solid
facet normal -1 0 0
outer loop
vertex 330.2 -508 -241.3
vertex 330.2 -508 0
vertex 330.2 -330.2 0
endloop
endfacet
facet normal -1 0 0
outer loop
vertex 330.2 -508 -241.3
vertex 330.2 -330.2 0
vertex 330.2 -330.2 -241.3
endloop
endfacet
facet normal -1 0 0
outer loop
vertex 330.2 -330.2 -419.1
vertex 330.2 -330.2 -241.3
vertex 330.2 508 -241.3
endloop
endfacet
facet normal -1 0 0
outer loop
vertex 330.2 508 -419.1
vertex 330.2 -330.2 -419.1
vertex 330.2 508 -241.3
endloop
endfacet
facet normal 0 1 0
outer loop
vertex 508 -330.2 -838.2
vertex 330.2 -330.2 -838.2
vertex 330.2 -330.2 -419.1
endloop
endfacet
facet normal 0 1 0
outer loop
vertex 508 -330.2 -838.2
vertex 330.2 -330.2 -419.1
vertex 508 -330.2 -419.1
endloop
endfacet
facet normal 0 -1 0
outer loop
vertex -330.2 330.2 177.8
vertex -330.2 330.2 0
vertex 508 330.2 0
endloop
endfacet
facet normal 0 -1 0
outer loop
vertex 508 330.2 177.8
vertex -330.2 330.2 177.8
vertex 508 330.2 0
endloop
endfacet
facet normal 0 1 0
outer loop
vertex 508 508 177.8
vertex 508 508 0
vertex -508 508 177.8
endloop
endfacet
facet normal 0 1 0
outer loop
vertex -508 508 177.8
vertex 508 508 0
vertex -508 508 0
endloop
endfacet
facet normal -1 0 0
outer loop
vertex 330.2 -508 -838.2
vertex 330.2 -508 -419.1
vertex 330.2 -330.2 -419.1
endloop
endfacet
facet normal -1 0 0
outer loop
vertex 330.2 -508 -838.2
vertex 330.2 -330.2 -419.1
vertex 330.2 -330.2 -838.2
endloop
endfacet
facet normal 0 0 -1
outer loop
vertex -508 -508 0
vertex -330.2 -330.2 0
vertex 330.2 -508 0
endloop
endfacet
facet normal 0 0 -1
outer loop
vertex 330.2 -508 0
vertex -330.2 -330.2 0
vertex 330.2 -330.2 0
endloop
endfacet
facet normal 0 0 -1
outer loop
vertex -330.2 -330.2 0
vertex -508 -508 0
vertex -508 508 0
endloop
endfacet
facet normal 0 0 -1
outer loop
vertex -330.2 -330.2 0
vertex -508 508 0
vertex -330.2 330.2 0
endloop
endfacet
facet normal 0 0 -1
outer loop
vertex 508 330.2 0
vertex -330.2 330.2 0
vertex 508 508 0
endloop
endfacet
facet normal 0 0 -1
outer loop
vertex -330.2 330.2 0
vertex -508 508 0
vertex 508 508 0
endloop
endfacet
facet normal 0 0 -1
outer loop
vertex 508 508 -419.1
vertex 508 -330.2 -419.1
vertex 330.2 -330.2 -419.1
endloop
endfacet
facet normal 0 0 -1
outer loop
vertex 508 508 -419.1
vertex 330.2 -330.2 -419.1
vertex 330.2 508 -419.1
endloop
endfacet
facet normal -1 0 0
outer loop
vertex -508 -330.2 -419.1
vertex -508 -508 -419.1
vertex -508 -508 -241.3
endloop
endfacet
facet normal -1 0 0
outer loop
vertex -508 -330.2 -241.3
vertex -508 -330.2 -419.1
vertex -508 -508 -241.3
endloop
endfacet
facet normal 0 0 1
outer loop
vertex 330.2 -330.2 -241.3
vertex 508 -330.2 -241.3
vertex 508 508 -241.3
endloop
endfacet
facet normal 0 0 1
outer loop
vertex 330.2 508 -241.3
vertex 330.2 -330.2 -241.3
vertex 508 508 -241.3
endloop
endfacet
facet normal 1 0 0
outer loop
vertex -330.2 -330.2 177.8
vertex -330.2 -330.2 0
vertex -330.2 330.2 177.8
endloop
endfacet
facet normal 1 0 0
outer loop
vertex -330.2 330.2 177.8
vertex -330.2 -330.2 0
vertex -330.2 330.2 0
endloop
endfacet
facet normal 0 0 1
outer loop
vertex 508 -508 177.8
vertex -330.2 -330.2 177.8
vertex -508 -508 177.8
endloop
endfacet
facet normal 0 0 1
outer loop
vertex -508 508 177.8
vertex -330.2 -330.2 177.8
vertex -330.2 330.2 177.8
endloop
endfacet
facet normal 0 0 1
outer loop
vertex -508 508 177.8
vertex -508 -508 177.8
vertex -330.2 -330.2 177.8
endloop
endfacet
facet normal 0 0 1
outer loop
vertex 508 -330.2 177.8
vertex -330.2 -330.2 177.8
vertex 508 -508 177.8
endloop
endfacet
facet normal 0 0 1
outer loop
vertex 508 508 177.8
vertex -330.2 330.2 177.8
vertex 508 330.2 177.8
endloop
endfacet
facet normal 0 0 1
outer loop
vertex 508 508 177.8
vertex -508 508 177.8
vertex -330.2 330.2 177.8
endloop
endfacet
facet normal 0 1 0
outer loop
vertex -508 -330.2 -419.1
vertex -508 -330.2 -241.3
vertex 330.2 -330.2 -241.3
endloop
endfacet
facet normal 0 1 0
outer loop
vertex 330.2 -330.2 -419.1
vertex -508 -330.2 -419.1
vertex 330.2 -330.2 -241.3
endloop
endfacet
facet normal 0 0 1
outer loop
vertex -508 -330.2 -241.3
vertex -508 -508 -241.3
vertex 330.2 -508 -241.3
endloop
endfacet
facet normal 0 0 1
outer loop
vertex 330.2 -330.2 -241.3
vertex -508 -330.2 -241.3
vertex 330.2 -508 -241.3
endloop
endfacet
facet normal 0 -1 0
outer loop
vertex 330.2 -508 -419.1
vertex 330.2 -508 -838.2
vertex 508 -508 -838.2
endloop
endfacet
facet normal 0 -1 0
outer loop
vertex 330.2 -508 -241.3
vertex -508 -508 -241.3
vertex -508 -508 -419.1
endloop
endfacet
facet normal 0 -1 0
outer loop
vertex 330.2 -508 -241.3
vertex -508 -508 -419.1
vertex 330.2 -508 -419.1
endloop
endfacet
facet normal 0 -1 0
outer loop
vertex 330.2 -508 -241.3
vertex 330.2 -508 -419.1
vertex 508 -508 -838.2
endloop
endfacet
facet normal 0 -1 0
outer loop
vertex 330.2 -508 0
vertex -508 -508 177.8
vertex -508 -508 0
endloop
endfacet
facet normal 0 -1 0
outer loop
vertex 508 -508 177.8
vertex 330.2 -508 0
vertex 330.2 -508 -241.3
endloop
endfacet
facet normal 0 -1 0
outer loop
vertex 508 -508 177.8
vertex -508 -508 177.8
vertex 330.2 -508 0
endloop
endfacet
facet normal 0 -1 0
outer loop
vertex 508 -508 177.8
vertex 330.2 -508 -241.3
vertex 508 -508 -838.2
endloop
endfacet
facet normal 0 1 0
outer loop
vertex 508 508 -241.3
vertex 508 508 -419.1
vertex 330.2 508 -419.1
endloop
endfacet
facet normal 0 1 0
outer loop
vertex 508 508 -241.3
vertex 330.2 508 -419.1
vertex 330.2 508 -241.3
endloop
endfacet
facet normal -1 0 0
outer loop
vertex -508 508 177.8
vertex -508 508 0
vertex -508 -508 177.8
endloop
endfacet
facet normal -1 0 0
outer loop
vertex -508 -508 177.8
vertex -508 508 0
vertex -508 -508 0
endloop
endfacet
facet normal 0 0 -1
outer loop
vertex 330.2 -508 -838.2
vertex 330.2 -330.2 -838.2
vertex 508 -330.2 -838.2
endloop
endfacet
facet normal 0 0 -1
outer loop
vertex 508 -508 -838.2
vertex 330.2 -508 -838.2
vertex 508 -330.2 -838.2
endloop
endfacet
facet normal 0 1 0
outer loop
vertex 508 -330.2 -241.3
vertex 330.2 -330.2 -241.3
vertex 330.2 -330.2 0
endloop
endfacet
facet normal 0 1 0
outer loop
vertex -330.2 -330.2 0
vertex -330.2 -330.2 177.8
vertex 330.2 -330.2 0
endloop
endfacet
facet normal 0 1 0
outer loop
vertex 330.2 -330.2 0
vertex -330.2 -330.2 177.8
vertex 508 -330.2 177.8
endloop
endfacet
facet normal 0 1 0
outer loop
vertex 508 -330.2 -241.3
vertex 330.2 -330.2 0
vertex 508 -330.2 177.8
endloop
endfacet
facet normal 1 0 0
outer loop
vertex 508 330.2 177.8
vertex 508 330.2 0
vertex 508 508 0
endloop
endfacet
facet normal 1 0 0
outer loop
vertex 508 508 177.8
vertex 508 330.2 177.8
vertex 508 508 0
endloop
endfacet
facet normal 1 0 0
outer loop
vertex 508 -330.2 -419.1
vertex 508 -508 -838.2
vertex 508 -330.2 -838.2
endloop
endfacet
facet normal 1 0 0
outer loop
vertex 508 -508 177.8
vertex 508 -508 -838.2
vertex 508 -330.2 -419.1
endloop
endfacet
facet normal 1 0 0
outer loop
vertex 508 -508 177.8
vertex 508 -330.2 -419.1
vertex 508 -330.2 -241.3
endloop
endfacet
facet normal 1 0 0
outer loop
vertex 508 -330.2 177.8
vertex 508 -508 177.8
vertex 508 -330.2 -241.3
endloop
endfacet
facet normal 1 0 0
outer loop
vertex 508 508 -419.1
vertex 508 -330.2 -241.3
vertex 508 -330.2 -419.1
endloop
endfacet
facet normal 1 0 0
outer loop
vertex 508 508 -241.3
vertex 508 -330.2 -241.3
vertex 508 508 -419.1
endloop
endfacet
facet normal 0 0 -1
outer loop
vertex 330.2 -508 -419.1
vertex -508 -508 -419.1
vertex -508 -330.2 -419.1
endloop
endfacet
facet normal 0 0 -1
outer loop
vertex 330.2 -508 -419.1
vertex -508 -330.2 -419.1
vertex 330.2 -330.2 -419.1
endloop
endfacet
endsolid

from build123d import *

# Parameters (mm, degrees)
F1_DEPTH = 177.8
F2_W     = 177.8
F2_H     = 241.3
F2_H_2   = 177.8
F2_H_3   = 419.1
F2_W_2   = 838.2
F3_DEPTH = 177.8
F4_W     = 838.2
F4_H     = 177.8
F5_DEPTH = 177.8


with BuildPart() as f1:
    # F0 (on Top) → F1 (new body)
    with BuildSketch(Plane.XY):
        Polygon((508, 330.2), (508, 508), (-508, 508), (-508, -508), (508, -508), (508, -330.2), (-330.2, -330.2), (-330.2, 330.2), align=None)
    extrude(amount=F1_DEPTH)

    # F2 (on face) → F3 (join)
    with BuildSketch(Plane.XZ.offset(508)):
        with Locations((419.1, -120.65)):
            Rectangle(F2_W, F2_H)
        with Locations((419.1, -330.2)):
            Rectangle(F2_W, F2_H_2)
        with Locations((419.1, -628.65)):
            Rectangle(F2_W, F2_H_3)
        with Locations((-88.9, -330.2)):
            Rectangle(F2_W_2, F2_H_2)
    extrude(amount=-F3_DEPTH)

    # F4 (on face) → F5 (join)
    with BuildSketch(Plane.YZ.offset(508)):
        with Locations((88.9, -330.2)):
            Rectangle(F4_W, F4_H)
    extrude(amount=-F5_DEPTH)


solid = f1.part
